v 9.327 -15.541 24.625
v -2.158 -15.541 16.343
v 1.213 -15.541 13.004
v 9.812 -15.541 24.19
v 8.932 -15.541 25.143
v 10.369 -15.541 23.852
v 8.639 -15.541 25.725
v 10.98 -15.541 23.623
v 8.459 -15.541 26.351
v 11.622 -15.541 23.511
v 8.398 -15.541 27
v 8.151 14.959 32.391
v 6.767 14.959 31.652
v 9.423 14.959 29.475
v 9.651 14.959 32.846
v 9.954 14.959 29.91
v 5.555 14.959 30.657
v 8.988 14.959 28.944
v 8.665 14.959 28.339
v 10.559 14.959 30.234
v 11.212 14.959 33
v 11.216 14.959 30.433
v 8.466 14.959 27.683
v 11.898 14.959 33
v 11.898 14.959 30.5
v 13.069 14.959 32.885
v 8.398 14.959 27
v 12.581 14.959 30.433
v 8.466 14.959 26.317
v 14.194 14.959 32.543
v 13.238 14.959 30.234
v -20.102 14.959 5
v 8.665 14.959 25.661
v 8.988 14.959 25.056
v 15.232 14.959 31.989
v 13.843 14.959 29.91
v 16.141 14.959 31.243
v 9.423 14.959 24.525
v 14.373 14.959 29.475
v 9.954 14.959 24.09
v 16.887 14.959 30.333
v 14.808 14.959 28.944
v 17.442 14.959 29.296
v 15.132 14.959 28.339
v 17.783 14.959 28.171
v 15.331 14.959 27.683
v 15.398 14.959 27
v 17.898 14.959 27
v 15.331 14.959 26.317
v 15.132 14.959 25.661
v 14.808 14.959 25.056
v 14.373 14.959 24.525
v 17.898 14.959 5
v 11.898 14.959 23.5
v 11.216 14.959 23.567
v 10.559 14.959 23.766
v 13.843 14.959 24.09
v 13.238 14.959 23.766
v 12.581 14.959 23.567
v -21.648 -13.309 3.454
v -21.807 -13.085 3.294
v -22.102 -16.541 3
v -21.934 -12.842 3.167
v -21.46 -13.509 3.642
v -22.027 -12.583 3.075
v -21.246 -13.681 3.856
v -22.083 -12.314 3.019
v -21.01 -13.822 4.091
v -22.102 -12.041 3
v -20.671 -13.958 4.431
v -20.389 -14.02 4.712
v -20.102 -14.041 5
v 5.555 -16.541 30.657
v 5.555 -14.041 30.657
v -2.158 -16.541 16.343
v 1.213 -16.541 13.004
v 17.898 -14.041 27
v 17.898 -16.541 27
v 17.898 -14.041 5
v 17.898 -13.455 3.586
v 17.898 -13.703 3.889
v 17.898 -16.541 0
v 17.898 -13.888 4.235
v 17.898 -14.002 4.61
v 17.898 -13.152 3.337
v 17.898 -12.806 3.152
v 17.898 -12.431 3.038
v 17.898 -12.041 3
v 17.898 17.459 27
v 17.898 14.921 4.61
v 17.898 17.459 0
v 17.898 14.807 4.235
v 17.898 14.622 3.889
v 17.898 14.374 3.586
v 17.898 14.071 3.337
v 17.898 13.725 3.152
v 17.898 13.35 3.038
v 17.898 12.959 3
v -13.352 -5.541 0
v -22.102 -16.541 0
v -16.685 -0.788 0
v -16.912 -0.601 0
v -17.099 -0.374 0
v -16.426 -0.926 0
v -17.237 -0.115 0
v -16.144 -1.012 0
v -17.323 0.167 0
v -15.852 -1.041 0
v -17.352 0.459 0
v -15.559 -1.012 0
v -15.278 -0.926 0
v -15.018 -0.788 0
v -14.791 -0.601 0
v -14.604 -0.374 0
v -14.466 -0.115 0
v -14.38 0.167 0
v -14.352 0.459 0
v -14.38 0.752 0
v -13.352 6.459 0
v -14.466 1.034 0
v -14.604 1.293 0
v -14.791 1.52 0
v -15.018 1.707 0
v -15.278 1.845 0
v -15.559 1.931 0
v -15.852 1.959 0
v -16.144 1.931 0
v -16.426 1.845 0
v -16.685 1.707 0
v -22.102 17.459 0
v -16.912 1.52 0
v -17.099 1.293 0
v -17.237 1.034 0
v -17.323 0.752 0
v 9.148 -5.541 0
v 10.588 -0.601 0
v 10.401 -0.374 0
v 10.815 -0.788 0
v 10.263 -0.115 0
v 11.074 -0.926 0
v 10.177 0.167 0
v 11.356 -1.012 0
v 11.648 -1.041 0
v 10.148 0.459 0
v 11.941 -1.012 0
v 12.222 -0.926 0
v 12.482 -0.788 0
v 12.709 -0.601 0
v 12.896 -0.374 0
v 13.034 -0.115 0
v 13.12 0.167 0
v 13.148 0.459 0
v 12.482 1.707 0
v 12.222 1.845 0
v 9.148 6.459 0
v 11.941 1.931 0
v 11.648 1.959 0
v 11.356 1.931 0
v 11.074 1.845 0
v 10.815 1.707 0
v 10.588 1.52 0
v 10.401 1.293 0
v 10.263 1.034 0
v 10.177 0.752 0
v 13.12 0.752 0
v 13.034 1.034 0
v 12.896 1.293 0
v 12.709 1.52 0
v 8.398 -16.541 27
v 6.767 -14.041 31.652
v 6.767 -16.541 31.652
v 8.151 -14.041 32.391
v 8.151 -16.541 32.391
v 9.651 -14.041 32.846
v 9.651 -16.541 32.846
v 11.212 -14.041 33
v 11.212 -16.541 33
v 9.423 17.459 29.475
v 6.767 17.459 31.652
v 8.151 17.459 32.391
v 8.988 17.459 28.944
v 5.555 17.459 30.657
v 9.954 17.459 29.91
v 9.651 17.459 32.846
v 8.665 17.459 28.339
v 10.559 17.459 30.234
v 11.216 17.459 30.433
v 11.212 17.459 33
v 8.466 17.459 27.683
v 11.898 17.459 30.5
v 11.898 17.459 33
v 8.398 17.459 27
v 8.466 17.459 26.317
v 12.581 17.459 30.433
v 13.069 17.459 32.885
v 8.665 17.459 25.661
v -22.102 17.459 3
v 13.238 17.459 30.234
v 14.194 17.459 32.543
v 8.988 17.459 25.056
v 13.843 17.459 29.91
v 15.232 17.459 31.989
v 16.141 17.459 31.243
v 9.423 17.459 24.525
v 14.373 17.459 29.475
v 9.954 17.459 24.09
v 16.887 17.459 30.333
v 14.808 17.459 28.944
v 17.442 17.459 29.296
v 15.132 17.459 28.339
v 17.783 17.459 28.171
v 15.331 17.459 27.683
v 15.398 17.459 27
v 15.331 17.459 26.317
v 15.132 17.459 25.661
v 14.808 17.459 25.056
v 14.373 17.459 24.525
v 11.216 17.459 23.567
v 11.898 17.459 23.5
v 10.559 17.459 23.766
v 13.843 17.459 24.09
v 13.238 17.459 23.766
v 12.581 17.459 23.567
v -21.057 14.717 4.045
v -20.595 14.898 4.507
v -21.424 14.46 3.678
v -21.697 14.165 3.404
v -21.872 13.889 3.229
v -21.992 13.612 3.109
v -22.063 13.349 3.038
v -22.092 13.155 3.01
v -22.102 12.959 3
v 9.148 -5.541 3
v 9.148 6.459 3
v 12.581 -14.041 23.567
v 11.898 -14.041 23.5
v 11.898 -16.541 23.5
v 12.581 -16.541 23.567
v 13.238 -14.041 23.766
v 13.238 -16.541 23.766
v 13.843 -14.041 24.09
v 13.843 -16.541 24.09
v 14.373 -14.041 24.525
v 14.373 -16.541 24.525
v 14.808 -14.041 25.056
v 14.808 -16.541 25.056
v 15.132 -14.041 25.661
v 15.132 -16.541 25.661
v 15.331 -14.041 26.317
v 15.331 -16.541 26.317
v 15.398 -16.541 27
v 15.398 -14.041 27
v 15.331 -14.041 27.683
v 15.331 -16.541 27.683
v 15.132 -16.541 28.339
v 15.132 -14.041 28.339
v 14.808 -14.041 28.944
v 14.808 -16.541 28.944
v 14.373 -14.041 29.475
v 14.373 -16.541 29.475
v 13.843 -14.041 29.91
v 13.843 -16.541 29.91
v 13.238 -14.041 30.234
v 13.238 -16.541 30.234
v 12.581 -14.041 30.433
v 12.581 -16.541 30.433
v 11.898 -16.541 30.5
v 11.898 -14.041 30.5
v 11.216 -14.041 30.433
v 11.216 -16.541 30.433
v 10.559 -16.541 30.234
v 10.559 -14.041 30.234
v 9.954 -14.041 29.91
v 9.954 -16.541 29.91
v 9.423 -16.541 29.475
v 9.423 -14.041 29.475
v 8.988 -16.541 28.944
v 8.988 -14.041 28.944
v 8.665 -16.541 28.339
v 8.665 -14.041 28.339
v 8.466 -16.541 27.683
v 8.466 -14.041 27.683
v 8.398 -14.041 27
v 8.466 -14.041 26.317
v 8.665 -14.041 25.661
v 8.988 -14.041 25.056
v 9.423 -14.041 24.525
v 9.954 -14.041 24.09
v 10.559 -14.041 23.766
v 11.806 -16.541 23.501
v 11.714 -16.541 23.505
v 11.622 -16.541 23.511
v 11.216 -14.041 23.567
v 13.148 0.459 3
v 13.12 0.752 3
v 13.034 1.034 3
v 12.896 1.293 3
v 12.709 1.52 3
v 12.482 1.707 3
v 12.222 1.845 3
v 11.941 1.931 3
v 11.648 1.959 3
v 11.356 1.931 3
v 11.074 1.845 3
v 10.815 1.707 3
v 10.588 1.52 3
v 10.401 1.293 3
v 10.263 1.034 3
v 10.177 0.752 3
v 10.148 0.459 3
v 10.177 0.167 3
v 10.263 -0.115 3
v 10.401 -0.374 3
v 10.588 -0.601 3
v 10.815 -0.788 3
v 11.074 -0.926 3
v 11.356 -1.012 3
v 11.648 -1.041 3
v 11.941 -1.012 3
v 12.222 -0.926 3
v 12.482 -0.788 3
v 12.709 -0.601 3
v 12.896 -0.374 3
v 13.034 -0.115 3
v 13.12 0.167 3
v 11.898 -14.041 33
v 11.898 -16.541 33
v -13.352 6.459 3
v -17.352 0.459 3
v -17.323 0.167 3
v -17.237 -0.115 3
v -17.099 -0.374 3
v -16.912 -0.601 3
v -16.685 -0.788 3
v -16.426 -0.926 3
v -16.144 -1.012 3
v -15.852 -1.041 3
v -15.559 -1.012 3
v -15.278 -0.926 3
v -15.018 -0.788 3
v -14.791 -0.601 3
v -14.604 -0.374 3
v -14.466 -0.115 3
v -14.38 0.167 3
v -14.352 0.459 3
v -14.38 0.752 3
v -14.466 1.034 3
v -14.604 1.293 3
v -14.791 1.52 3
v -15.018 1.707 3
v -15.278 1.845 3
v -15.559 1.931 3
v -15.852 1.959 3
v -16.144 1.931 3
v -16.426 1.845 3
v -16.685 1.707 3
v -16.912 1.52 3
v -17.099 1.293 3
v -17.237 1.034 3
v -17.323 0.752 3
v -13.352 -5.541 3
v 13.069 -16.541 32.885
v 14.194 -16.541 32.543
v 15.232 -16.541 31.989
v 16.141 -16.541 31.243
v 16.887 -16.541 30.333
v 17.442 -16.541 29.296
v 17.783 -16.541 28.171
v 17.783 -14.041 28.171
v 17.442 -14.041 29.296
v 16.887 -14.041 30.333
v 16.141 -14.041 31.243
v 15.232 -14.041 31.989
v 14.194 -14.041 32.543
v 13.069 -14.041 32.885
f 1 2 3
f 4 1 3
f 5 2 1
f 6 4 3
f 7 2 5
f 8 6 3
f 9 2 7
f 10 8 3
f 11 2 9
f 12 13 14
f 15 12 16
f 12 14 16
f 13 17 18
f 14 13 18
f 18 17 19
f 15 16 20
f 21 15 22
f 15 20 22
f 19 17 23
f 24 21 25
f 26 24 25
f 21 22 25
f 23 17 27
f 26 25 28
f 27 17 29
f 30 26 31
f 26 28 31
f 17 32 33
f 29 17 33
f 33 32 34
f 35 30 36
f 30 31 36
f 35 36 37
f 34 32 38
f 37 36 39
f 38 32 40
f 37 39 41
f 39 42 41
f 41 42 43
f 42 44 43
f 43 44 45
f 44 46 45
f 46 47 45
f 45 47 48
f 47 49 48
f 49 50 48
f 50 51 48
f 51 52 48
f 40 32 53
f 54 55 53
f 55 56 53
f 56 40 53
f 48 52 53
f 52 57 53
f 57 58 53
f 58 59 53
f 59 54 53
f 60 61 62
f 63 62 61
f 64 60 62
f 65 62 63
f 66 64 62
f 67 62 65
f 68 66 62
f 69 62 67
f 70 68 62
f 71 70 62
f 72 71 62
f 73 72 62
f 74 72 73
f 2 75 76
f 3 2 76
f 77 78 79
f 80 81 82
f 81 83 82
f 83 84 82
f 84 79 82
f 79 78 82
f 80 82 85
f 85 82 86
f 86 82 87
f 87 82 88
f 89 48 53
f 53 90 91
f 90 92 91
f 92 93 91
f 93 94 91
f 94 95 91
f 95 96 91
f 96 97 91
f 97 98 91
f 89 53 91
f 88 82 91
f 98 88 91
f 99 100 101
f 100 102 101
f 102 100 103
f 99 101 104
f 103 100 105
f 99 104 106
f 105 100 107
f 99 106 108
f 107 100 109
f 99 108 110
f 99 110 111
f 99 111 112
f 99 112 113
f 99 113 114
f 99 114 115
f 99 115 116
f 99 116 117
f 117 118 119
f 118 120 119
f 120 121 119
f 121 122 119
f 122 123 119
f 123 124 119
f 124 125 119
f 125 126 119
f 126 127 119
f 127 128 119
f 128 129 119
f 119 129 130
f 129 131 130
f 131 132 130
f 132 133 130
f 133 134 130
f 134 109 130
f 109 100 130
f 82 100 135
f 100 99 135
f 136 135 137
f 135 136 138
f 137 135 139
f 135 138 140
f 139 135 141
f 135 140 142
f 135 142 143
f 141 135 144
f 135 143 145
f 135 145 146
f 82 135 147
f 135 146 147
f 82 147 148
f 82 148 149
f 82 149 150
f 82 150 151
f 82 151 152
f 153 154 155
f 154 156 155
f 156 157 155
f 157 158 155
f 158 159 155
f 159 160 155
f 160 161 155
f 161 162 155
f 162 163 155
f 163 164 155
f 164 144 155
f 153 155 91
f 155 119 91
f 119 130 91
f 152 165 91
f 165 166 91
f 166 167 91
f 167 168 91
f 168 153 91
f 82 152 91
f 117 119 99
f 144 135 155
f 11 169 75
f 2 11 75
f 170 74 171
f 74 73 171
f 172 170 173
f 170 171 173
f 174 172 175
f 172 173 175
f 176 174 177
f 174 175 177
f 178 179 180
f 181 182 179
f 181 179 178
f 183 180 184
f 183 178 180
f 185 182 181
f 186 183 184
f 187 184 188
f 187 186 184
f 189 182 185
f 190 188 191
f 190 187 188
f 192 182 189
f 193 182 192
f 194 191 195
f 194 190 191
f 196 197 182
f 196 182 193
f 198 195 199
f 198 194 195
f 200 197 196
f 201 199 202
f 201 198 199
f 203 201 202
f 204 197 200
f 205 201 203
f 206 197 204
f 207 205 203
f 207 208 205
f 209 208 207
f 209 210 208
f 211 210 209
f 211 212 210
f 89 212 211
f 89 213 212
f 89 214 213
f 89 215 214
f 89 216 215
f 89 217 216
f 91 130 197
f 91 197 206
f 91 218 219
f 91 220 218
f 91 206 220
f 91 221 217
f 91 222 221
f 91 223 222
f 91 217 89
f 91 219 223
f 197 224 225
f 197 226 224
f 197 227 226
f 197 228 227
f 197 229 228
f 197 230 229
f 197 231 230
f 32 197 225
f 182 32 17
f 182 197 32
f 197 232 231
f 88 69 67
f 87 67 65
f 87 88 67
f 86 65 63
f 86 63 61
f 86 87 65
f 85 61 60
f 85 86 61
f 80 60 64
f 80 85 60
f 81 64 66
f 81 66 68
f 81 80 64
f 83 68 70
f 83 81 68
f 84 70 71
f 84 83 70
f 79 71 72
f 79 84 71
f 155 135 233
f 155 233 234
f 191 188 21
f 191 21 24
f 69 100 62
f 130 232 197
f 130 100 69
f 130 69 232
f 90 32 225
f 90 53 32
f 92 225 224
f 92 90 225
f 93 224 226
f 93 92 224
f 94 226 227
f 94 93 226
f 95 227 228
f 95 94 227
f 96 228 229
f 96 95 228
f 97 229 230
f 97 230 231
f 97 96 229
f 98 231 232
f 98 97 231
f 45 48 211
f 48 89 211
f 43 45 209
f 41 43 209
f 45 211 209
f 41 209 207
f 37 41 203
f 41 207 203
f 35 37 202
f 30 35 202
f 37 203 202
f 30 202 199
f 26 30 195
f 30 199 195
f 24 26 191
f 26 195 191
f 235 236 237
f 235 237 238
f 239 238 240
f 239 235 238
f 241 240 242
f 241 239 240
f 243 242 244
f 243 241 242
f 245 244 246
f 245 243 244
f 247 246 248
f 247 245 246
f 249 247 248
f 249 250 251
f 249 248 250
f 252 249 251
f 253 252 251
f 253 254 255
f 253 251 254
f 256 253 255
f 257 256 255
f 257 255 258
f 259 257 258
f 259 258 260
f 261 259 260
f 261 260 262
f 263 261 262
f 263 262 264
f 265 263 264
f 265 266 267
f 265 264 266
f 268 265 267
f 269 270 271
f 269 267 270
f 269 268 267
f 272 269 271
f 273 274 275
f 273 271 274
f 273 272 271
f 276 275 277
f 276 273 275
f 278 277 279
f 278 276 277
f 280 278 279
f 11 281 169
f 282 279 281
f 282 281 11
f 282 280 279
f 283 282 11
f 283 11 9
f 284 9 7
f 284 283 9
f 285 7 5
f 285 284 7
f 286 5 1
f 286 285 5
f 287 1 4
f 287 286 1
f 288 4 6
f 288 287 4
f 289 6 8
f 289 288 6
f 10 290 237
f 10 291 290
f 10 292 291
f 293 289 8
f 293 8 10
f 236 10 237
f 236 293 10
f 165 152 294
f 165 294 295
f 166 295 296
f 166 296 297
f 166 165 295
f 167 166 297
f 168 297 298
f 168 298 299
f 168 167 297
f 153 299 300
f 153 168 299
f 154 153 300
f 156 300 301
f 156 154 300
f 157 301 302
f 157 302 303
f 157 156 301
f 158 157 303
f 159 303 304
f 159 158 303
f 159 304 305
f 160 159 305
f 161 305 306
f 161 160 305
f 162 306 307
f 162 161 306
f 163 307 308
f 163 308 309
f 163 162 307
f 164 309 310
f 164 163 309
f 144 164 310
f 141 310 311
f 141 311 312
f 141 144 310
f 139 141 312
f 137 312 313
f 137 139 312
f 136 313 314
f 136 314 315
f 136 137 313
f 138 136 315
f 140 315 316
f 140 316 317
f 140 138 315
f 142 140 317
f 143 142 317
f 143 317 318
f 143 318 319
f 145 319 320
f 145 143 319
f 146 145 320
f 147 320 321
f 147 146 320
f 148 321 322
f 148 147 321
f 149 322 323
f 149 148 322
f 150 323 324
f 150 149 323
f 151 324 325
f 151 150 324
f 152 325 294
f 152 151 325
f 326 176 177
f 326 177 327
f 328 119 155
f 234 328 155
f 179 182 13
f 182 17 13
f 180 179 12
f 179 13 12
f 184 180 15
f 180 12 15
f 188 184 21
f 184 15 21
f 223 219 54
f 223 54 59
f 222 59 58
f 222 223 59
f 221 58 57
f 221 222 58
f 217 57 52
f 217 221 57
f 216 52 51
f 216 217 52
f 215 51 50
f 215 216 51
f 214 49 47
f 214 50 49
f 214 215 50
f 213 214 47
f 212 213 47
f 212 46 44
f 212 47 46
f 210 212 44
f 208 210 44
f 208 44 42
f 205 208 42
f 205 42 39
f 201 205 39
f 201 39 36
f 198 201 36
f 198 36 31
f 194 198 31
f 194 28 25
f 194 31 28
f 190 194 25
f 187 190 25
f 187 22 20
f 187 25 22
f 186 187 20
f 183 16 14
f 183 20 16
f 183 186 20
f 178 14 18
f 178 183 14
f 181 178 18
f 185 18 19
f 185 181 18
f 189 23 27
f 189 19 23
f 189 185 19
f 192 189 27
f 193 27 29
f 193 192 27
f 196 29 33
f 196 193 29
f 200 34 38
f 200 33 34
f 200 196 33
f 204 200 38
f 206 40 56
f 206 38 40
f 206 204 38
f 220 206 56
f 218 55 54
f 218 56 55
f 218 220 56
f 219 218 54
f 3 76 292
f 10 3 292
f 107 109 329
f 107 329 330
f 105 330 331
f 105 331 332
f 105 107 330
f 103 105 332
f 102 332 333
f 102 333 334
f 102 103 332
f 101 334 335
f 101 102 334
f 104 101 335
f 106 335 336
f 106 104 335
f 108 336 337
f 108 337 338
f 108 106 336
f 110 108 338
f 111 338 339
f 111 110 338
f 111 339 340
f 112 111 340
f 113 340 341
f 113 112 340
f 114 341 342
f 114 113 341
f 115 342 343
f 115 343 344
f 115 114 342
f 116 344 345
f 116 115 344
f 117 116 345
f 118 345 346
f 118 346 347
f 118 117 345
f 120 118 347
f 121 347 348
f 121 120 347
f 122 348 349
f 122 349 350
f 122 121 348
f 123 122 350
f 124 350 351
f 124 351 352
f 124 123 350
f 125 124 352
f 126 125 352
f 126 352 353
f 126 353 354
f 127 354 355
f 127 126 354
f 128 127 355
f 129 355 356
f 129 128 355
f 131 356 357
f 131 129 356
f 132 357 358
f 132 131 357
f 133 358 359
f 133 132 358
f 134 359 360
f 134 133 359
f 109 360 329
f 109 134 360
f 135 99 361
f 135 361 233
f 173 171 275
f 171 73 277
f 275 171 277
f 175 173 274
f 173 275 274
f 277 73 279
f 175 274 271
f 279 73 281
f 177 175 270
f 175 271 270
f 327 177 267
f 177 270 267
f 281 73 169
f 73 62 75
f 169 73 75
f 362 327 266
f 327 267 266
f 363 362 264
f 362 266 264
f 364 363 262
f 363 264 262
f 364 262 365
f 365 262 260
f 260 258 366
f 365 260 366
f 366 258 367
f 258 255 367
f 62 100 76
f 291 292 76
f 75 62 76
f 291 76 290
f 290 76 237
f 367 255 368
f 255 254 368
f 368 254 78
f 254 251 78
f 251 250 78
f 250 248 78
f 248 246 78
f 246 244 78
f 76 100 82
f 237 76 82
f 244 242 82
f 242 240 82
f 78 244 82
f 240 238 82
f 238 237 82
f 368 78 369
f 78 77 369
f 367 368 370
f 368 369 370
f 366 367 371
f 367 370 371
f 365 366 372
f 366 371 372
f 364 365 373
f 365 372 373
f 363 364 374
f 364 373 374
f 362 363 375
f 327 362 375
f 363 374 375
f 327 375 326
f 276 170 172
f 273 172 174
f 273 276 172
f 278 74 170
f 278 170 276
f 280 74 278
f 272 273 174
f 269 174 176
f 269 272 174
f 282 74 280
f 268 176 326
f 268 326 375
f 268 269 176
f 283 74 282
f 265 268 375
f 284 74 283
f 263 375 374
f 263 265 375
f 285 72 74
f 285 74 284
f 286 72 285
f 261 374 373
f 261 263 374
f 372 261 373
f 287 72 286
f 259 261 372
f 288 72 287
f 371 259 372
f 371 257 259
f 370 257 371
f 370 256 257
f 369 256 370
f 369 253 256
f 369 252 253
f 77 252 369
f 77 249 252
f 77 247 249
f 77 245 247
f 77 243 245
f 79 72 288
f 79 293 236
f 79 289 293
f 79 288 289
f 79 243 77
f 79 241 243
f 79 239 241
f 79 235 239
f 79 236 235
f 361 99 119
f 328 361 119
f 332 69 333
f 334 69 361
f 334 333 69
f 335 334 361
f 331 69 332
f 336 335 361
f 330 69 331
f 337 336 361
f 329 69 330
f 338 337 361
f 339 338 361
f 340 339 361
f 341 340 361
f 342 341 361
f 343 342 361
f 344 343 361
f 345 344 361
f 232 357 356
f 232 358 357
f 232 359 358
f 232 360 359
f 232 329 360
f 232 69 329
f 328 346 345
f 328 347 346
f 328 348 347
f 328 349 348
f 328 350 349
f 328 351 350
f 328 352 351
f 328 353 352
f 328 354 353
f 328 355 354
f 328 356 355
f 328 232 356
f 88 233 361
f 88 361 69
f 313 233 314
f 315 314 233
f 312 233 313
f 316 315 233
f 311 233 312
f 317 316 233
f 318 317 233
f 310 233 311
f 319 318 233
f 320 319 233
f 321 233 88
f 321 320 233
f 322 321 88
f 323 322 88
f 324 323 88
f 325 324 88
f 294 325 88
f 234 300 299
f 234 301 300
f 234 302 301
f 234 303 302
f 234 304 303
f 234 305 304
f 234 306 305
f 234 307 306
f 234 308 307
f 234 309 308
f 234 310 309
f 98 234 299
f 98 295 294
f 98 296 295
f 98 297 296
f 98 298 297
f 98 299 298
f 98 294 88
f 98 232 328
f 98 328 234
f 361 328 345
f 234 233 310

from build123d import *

# Parameters (mm, degrees)
ESBO_O1_W                  = 40
ESBO_O1_H                  = 34
ESBO_O1_R                  = 1.5
ESBO_O1_W_2                = 22.5
ESBO_O1_H_2                = 12
RESSALTO_EXTRUS_O1_DEPTH   = 3
ESBO_O2_W                  = 40
ESBO_O2_H                  = 2.5
RESSALTO_EXTRUS_O2_DEPTH   = 30
CORTE_EXTRUS_O1_DEPTH      = 53.282720471
CORTE_EXTRUS_O1_DEPTH_BACK = 53.282720471
ESBO_O3_R                  = 3.5
FILETE1_R                  = 6
FILETE2_R                  = 2
CORTE_EXTRUS_O2_DEPTH      = 1
FILETE4_R                  = 8


with BuildPart() as part:
    # Esboço1 → Ressalto-extrusão1 (new body)
    with BuildSketch(Plane.XY):
        with Locations((-2.101648352, 0.459478022)):
            Rectangle(ESBO_O1_W, ESBO_O1_H)
        with Locations((11.648351648, 0.459478022)):
            Circle(ESBO_O1_R, mode=Mode.SUBTRACT)
        with Locations(Location((-15.851648352, 0.459478022, 0), (0, 0, 180))):
            Circle(ESBO_O1_R, mode=Mode.SUBTRACT)
        with Locations((-2.101648352, 0.459478022)):
            Rectangle(ESBO_O1_W_2, ESBO_O1_H_2, mode=Mode.SUBTRACT)
    extrude(amount=RESSALTO_EXTRUS_O1_DEPTH)

    # Esboço2 → Ressalto-extrusão2 (add)
    with BuildSketch(Plane.XY.offset(3)):
        with Locations((-2.101648352, 16.209478022)):
            Rectangle(ESBO_O2_W, ESBO_O2_H)
        with Locations((-2.101648352, -15.290521978)):
            Rectangle(ESBO_O2_W, ESBO_O2_H)
    extrude(amount=RESSALTO_EXTRUS_O2_DEPTH)

    # Esboço3 → Corte-extrusão1 (cut, two sides: drawn at the far end of the back side and taken through both)
    with BuildSketch(Plane.XZ.offset(16.540521978).offset(-CORTE_EXTRUS_O1_DEPTH_BACK)):
        with Locations(Location((11.898351648, 27, 0), (0, 0, 270))):
            Circle(ESBO_O3_R)
        Polygon((-22.101648352, 3), (7.898351648, 33), (-22.101648352, 33), align=None)
    extrude(amount=CORTE_EXTRUS_O1_DEPTH + CORTE_EXTRUS_O1_DEPTH_BACK, mode=Mode.SUBTRACT)

    # Filete1
    filete1_edges = [part.edges().sort_by_distance(p)[0] for p in [
        (17.898351648, 16.209478022, 33),
        (17.898351648, -15.290521978, 33),
    ]]
    fillet(filete1_edges, radius=FILETE1_R)

    # Filete2
    filete2_edges = [part.edges().sort_by_distance(p)[0] for p in [
        (-2.101648352, 14.959478022, 3),
        (-2.101648352, -14.040521978, 3),
    ]]
    fillet(filete2_edges, radius=FILETE2_R)

    # Esboço4 → Corte-extrusão2 (cut)
    with BuildSketch(Plane.XZ.offset(16.540521978)):
        Polygon((8.398351648, 27), (-2.157894846, 16.343280995), (1.213419281, 13.003751923), (11.621565934, 23.510961498), align=None)
    extrude(amount=-CORTE_EXTRUS_O2_DEPTH, mode=Mode.SUBTRACT)

    # Filete4
    filete4_edges = [part.edges().sort_by_distance(p)[0] for p in [
        (7.898351648, -15.290521978, 33),
        (7.898351648, 16.209478022, 33),
    ]]
    fillet(filete4_edges, radius=FILETE4_R)


solid = part.part
